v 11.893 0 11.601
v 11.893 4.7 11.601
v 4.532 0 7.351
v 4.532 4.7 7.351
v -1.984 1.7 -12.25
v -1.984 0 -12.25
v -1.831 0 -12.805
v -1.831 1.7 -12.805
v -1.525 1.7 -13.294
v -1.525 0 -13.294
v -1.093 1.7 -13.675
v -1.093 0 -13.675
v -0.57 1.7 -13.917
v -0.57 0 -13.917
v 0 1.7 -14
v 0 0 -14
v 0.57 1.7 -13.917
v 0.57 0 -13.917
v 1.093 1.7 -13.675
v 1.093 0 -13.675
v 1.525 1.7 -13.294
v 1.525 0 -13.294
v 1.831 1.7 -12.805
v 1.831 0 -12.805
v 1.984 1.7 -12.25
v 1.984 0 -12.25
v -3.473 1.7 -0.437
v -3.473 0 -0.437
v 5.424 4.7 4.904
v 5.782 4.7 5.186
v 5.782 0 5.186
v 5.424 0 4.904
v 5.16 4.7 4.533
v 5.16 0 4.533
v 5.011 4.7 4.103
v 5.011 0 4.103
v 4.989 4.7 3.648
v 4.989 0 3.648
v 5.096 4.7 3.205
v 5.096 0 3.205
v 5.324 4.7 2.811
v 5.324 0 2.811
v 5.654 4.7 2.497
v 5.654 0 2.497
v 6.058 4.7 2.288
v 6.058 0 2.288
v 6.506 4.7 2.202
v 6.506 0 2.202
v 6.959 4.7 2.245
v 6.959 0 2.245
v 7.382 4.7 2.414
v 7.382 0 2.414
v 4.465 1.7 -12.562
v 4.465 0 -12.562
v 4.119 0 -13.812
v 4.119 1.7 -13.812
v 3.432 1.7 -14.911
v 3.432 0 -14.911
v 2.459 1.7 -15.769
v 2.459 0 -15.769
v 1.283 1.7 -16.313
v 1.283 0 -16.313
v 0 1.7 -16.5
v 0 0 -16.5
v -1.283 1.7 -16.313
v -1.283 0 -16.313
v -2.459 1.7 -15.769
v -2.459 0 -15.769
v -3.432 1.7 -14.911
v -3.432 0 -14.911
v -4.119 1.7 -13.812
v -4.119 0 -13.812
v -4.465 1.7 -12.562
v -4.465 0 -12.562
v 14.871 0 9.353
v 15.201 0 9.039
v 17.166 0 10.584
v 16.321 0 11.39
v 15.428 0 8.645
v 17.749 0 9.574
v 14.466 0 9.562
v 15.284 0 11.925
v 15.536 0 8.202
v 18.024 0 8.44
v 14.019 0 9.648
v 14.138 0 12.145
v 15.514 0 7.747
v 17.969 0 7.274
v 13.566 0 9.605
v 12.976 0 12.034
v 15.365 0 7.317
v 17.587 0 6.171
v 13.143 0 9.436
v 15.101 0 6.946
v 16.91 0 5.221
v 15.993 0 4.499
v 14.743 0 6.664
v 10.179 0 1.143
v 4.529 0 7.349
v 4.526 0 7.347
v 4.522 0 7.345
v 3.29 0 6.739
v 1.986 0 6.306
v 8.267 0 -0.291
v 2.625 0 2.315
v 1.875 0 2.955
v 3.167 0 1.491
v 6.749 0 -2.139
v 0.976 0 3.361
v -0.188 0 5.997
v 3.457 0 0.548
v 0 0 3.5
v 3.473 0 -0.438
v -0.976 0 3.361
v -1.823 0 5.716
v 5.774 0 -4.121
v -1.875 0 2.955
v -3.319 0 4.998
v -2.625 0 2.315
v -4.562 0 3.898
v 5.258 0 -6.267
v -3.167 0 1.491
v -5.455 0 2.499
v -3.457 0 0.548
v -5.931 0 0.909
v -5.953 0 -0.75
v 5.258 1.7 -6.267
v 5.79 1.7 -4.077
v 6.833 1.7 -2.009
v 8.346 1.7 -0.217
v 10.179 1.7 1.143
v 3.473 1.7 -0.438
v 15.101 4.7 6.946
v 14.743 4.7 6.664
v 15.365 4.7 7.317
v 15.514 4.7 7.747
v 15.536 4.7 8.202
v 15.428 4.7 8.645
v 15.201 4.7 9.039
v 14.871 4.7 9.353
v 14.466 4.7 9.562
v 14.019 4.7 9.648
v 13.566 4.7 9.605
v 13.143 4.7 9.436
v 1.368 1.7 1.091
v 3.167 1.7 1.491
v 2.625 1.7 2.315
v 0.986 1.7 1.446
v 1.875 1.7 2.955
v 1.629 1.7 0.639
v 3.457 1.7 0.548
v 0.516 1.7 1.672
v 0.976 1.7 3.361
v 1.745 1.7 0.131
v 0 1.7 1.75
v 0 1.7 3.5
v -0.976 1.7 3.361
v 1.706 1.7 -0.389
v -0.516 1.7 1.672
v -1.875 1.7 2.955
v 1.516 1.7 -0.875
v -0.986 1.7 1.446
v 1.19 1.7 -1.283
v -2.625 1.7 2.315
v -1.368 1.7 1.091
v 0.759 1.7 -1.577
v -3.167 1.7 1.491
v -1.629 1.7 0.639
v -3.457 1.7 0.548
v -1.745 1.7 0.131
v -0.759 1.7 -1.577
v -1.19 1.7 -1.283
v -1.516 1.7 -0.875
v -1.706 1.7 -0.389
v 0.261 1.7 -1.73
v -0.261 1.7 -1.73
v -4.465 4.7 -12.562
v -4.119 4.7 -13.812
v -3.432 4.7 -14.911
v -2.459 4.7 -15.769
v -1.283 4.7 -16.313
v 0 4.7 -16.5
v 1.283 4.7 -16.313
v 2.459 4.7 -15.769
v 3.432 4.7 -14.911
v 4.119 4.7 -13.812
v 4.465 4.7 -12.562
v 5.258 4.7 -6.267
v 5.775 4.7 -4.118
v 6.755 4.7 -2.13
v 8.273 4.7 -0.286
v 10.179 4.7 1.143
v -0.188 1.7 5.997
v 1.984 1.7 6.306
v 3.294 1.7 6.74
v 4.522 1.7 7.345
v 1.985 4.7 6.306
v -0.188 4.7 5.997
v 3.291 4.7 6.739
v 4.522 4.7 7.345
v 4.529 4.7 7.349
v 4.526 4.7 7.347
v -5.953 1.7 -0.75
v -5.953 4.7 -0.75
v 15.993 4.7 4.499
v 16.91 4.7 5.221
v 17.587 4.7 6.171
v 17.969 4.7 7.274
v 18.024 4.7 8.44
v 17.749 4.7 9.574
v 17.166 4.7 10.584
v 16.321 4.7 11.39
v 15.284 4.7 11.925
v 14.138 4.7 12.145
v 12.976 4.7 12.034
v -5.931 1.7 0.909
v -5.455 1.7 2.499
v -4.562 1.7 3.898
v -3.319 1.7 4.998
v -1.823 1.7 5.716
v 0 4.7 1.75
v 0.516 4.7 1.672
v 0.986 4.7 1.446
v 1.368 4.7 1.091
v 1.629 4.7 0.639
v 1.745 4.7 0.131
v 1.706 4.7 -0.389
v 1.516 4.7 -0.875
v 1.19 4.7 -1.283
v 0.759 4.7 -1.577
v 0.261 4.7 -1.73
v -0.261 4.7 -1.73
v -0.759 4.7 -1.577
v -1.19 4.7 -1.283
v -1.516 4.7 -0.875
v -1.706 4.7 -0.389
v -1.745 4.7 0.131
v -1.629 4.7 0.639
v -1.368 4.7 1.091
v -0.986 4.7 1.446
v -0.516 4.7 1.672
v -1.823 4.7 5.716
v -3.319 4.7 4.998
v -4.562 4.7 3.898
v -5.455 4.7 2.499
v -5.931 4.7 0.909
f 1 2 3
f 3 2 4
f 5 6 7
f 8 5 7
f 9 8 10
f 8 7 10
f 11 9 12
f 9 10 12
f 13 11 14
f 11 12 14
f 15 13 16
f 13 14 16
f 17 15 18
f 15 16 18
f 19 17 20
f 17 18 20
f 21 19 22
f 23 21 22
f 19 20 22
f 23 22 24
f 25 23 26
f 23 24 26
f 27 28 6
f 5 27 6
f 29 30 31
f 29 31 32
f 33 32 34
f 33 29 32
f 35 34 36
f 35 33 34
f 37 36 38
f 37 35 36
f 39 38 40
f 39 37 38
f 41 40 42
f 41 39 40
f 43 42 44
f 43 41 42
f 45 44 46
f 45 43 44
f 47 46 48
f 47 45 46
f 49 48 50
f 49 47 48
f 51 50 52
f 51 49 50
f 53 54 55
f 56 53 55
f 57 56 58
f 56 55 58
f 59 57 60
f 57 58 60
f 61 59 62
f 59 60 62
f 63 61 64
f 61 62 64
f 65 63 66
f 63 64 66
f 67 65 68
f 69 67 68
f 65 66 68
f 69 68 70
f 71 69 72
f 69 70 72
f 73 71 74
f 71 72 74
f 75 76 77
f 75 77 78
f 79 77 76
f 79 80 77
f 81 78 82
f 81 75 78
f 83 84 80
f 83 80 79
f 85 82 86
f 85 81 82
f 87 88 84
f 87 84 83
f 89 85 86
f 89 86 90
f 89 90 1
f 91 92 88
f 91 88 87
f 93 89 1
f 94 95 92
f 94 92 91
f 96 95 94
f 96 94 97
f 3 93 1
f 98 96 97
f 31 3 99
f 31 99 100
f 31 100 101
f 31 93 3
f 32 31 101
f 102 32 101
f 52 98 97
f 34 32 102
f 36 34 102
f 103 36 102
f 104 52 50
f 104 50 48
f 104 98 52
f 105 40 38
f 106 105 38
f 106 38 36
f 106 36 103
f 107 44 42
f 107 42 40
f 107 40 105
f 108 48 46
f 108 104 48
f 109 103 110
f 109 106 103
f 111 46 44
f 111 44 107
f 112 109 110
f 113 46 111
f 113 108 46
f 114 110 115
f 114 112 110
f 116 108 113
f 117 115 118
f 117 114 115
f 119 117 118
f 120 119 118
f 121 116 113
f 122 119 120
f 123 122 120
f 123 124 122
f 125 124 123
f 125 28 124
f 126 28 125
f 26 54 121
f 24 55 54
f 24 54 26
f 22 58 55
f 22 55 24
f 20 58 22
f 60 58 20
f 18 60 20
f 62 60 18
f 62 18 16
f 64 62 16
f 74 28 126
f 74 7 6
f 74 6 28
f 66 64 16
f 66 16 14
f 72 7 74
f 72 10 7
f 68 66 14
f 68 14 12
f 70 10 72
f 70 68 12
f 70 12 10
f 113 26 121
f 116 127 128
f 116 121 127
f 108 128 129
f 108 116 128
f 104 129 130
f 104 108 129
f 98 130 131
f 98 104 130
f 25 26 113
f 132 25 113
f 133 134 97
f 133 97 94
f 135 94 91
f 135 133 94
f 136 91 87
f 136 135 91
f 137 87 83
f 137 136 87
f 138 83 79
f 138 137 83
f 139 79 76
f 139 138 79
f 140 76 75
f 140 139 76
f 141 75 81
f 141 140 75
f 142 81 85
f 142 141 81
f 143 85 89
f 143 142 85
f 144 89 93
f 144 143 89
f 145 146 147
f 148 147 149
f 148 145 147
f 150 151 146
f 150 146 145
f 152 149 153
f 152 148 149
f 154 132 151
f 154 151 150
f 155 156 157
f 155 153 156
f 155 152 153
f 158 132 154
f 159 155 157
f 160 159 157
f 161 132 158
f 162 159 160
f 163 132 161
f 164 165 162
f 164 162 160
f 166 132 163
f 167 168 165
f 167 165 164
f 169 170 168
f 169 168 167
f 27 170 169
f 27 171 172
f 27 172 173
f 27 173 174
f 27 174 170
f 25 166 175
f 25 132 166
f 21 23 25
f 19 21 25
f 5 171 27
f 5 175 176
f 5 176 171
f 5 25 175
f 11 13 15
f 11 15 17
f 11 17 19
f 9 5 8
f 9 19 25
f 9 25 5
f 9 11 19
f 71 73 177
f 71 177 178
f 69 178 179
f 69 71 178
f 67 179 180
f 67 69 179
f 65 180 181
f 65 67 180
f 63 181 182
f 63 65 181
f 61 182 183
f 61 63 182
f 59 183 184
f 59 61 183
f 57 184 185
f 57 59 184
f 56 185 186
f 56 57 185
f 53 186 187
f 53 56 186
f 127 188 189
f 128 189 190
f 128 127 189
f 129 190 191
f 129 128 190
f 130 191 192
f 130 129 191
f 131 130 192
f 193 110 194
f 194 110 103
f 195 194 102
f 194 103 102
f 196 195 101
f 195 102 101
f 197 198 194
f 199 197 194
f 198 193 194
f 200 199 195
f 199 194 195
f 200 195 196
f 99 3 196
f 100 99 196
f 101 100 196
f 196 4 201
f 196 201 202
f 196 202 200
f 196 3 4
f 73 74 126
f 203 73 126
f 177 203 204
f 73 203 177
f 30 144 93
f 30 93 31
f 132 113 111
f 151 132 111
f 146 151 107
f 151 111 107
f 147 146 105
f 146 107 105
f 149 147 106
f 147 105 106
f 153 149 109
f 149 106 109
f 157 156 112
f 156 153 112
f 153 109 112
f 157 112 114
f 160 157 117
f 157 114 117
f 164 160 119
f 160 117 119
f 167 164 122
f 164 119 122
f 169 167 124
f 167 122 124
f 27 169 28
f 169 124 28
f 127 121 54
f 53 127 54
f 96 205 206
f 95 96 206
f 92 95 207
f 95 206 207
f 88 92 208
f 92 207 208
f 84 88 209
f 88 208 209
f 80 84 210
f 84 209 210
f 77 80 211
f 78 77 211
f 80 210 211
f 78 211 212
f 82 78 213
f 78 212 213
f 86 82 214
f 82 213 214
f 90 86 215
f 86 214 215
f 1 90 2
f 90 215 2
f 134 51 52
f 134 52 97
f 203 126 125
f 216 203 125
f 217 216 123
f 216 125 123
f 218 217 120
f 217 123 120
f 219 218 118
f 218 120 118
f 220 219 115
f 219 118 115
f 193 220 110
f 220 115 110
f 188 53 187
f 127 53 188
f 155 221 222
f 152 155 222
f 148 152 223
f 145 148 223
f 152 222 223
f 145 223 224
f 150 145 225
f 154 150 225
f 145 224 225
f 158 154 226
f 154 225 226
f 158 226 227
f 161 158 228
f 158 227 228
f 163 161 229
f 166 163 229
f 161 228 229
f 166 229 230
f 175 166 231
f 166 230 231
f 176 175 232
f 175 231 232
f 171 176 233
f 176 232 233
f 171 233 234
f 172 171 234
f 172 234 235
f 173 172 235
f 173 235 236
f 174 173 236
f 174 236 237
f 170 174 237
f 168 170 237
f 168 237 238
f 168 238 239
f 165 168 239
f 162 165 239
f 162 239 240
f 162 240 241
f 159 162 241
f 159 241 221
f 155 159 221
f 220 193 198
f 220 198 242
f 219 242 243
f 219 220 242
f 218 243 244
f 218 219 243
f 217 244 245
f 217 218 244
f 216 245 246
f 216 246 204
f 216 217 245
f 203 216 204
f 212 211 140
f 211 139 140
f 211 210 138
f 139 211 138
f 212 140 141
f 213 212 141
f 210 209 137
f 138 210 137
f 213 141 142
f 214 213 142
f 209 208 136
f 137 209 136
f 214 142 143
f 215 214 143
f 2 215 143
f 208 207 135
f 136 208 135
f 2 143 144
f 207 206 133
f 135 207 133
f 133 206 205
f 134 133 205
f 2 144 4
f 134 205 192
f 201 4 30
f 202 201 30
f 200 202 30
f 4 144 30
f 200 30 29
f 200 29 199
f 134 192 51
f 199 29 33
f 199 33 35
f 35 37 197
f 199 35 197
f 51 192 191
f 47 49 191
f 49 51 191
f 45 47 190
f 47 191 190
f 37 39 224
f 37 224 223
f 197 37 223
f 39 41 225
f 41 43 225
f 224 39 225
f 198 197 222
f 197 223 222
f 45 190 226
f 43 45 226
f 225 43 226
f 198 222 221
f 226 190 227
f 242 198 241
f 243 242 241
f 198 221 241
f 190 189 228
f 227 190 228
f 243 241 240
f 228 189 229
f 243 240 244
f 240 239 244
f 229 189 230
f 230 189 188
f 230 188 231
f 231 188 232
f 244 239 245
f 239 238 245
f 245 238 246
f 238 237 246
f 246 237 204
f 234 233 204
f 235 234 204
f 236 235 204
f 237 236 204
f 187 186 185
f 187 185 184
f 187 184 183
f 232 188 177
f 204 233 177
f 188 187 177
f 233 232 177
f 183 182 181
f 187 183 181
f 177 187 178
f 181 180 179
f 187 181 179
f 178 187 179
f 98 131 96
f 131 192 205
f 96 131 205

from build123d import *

# Parameters (mm, degrees)
EXTRUDE_THIN1_DEPTH = 1.7
BOSS_EXTRUDE1_DEPTH = 3
EXTRUDE_THIN2_DEPTH = 4.7
FILLET1_R           = 10
SKETCH5_R           = 1.75
CUT_EXTRUDE1_DEPTH  = 25.897593892909114


# Read off the part's stored shape, not the designer's step: Extrude-Thin1
with BuildPart() as part:
    # Extrude-Thin1 outline → Extrude-Thin1 (new body)
    with BuildSketch(Plane(origin=(0, 0, 0), x_dir=(1, 0, 0), z_dir=(0, 1, 0))):
        with BuildLine():
            ThreePointArc((4.464705337, 12.5625), (0, 16.5), (-4.464705337, 12.5625))
            Line((-4.464705337, 12.5625), (-5.95294045, 0.75))
            ThreePointArc((-5.95294045, 0.75), (0, -6), (5.95294045, 0.75))
            Line((5.95294045, 0.75), (4.464705337, 12.5625))
        make_face()
        with BuildLine():
            Line((-3.472548596, 0.4375), (-1.984313483, 12.25))
            ThreePointArc((-1.984313483, 12.25), (0, 14), (1.984313483, 12.25))
            Line((1.984313483, 12.25), (3.472548596, 0.4375))
            ThreePointArc((3.472548596, 0.4375), (0, -3.5), (-3.472548596, 0.4375))
        make_face(mode=Mode.SUBTRACT)
    extrude(amount=EXTRUDE_THIN1_DEPTH)

    # Sketch2 → Boss-Extrude1 (add)
    with BuildSketch(Plane(origin=(0, 1.7, 0), x_dir=(1, 0, 0), z_dir=(0, 1, 0))):
        with BuildLine():
            Line((4.464705337421497, 12.5625), (5.952940449895328, 0.7499999999999997))
            ThreePointArc((5.952940449895328, 0.7499999999999997), (-1.1e-15, -6.000000000000001), (-5.95294044989533, 0.7500000000000003))
            Line((-5.95294044989533, 0.7500000000000003), (-4.464705337421497, 12.562499999999998))
            ThreePointArc((-4.464705337421497, 12.562499999999998), (-7.2e-16, 16.5), (4.464705337421497, 12.5625))
        make_face()
    extrude(amount=BOSS_EXTRUDE1_DEPTH)

    # Sketch4 → Extrude-Thin2 (add, through all)
    with BuildSketch(Plane(origin=(0, 4.7, 0), x_dir=(1, 0, 0), z_dir=(0, 1, 0))):
        with BuildLine():
            Line((8.631793068761734, -0.2492958444837754), (15.993009000929478, -4.499295844483755))
            ThreePointArc((15.99300900092945, -4.499295844483736), (17.49371315644571, -10.099999999999966), (11.893009000929466, -11.600704155516153))
            Line((11.893009000929494, -11.60070415551617), (4.531793068761752, -7.350704155516189))
            ThreePointArc((4.531793068761758, -7.350704155516187), (3.0310889132455334, -1.7499999999999925), (8.631793068761736, -0.24929584448377584))
        make_face()
        with BuildLine():
            Line((7.381793068761741, -2.4143593539448753), (14.743009000929485, -6.664359353944855))
            ThreePointArc((14.743009000929485, -6.664359353944855), (15.328649646984612, -8.849999999999971), (13.143009000929489, -9.43564064605507))
            Line((13.143009000929489, -9.43564064605507), (5.781793068761747, -5.185640646055089))
            ThreePointArc((5.781793068761747, -5.185640646055089), (5.196152422706634, -2.999999999999985), (7.381793068761741, -2.4143593539448753))
        make_face(mode=Mode.SUBTRACT)
    extrude(amount=-EXTRUDE_THIN2_DEPTH)

    # Fillet1
    fillet1_edges = [part.edges().sort_by_distance(p)[0] for p in [
        (5.994462735157251, 3.2, -0.2577140213706832),
        (2.7740444781602016, 3.2, 5.320214021370655),
    ]]
    fillet(fillet1_edges, radius=FILLET1_R)

    # Sketch5 → Cut-Extrude1 (cut, through all)
    with BuildSketch(Plane(origin=(0, 4.7, 0), x_dir=(1, 0, 0), z_dir=(0, 1, 0))):
        with Locations(Location((0, 0, 0), (0, 0, 270))):
            Circle(SKETCH5_R)
    extrude(amount=-CUT_EXTRUDE1_DEPTH, mode=Mode.SUBTRACT)


solid = part.part
